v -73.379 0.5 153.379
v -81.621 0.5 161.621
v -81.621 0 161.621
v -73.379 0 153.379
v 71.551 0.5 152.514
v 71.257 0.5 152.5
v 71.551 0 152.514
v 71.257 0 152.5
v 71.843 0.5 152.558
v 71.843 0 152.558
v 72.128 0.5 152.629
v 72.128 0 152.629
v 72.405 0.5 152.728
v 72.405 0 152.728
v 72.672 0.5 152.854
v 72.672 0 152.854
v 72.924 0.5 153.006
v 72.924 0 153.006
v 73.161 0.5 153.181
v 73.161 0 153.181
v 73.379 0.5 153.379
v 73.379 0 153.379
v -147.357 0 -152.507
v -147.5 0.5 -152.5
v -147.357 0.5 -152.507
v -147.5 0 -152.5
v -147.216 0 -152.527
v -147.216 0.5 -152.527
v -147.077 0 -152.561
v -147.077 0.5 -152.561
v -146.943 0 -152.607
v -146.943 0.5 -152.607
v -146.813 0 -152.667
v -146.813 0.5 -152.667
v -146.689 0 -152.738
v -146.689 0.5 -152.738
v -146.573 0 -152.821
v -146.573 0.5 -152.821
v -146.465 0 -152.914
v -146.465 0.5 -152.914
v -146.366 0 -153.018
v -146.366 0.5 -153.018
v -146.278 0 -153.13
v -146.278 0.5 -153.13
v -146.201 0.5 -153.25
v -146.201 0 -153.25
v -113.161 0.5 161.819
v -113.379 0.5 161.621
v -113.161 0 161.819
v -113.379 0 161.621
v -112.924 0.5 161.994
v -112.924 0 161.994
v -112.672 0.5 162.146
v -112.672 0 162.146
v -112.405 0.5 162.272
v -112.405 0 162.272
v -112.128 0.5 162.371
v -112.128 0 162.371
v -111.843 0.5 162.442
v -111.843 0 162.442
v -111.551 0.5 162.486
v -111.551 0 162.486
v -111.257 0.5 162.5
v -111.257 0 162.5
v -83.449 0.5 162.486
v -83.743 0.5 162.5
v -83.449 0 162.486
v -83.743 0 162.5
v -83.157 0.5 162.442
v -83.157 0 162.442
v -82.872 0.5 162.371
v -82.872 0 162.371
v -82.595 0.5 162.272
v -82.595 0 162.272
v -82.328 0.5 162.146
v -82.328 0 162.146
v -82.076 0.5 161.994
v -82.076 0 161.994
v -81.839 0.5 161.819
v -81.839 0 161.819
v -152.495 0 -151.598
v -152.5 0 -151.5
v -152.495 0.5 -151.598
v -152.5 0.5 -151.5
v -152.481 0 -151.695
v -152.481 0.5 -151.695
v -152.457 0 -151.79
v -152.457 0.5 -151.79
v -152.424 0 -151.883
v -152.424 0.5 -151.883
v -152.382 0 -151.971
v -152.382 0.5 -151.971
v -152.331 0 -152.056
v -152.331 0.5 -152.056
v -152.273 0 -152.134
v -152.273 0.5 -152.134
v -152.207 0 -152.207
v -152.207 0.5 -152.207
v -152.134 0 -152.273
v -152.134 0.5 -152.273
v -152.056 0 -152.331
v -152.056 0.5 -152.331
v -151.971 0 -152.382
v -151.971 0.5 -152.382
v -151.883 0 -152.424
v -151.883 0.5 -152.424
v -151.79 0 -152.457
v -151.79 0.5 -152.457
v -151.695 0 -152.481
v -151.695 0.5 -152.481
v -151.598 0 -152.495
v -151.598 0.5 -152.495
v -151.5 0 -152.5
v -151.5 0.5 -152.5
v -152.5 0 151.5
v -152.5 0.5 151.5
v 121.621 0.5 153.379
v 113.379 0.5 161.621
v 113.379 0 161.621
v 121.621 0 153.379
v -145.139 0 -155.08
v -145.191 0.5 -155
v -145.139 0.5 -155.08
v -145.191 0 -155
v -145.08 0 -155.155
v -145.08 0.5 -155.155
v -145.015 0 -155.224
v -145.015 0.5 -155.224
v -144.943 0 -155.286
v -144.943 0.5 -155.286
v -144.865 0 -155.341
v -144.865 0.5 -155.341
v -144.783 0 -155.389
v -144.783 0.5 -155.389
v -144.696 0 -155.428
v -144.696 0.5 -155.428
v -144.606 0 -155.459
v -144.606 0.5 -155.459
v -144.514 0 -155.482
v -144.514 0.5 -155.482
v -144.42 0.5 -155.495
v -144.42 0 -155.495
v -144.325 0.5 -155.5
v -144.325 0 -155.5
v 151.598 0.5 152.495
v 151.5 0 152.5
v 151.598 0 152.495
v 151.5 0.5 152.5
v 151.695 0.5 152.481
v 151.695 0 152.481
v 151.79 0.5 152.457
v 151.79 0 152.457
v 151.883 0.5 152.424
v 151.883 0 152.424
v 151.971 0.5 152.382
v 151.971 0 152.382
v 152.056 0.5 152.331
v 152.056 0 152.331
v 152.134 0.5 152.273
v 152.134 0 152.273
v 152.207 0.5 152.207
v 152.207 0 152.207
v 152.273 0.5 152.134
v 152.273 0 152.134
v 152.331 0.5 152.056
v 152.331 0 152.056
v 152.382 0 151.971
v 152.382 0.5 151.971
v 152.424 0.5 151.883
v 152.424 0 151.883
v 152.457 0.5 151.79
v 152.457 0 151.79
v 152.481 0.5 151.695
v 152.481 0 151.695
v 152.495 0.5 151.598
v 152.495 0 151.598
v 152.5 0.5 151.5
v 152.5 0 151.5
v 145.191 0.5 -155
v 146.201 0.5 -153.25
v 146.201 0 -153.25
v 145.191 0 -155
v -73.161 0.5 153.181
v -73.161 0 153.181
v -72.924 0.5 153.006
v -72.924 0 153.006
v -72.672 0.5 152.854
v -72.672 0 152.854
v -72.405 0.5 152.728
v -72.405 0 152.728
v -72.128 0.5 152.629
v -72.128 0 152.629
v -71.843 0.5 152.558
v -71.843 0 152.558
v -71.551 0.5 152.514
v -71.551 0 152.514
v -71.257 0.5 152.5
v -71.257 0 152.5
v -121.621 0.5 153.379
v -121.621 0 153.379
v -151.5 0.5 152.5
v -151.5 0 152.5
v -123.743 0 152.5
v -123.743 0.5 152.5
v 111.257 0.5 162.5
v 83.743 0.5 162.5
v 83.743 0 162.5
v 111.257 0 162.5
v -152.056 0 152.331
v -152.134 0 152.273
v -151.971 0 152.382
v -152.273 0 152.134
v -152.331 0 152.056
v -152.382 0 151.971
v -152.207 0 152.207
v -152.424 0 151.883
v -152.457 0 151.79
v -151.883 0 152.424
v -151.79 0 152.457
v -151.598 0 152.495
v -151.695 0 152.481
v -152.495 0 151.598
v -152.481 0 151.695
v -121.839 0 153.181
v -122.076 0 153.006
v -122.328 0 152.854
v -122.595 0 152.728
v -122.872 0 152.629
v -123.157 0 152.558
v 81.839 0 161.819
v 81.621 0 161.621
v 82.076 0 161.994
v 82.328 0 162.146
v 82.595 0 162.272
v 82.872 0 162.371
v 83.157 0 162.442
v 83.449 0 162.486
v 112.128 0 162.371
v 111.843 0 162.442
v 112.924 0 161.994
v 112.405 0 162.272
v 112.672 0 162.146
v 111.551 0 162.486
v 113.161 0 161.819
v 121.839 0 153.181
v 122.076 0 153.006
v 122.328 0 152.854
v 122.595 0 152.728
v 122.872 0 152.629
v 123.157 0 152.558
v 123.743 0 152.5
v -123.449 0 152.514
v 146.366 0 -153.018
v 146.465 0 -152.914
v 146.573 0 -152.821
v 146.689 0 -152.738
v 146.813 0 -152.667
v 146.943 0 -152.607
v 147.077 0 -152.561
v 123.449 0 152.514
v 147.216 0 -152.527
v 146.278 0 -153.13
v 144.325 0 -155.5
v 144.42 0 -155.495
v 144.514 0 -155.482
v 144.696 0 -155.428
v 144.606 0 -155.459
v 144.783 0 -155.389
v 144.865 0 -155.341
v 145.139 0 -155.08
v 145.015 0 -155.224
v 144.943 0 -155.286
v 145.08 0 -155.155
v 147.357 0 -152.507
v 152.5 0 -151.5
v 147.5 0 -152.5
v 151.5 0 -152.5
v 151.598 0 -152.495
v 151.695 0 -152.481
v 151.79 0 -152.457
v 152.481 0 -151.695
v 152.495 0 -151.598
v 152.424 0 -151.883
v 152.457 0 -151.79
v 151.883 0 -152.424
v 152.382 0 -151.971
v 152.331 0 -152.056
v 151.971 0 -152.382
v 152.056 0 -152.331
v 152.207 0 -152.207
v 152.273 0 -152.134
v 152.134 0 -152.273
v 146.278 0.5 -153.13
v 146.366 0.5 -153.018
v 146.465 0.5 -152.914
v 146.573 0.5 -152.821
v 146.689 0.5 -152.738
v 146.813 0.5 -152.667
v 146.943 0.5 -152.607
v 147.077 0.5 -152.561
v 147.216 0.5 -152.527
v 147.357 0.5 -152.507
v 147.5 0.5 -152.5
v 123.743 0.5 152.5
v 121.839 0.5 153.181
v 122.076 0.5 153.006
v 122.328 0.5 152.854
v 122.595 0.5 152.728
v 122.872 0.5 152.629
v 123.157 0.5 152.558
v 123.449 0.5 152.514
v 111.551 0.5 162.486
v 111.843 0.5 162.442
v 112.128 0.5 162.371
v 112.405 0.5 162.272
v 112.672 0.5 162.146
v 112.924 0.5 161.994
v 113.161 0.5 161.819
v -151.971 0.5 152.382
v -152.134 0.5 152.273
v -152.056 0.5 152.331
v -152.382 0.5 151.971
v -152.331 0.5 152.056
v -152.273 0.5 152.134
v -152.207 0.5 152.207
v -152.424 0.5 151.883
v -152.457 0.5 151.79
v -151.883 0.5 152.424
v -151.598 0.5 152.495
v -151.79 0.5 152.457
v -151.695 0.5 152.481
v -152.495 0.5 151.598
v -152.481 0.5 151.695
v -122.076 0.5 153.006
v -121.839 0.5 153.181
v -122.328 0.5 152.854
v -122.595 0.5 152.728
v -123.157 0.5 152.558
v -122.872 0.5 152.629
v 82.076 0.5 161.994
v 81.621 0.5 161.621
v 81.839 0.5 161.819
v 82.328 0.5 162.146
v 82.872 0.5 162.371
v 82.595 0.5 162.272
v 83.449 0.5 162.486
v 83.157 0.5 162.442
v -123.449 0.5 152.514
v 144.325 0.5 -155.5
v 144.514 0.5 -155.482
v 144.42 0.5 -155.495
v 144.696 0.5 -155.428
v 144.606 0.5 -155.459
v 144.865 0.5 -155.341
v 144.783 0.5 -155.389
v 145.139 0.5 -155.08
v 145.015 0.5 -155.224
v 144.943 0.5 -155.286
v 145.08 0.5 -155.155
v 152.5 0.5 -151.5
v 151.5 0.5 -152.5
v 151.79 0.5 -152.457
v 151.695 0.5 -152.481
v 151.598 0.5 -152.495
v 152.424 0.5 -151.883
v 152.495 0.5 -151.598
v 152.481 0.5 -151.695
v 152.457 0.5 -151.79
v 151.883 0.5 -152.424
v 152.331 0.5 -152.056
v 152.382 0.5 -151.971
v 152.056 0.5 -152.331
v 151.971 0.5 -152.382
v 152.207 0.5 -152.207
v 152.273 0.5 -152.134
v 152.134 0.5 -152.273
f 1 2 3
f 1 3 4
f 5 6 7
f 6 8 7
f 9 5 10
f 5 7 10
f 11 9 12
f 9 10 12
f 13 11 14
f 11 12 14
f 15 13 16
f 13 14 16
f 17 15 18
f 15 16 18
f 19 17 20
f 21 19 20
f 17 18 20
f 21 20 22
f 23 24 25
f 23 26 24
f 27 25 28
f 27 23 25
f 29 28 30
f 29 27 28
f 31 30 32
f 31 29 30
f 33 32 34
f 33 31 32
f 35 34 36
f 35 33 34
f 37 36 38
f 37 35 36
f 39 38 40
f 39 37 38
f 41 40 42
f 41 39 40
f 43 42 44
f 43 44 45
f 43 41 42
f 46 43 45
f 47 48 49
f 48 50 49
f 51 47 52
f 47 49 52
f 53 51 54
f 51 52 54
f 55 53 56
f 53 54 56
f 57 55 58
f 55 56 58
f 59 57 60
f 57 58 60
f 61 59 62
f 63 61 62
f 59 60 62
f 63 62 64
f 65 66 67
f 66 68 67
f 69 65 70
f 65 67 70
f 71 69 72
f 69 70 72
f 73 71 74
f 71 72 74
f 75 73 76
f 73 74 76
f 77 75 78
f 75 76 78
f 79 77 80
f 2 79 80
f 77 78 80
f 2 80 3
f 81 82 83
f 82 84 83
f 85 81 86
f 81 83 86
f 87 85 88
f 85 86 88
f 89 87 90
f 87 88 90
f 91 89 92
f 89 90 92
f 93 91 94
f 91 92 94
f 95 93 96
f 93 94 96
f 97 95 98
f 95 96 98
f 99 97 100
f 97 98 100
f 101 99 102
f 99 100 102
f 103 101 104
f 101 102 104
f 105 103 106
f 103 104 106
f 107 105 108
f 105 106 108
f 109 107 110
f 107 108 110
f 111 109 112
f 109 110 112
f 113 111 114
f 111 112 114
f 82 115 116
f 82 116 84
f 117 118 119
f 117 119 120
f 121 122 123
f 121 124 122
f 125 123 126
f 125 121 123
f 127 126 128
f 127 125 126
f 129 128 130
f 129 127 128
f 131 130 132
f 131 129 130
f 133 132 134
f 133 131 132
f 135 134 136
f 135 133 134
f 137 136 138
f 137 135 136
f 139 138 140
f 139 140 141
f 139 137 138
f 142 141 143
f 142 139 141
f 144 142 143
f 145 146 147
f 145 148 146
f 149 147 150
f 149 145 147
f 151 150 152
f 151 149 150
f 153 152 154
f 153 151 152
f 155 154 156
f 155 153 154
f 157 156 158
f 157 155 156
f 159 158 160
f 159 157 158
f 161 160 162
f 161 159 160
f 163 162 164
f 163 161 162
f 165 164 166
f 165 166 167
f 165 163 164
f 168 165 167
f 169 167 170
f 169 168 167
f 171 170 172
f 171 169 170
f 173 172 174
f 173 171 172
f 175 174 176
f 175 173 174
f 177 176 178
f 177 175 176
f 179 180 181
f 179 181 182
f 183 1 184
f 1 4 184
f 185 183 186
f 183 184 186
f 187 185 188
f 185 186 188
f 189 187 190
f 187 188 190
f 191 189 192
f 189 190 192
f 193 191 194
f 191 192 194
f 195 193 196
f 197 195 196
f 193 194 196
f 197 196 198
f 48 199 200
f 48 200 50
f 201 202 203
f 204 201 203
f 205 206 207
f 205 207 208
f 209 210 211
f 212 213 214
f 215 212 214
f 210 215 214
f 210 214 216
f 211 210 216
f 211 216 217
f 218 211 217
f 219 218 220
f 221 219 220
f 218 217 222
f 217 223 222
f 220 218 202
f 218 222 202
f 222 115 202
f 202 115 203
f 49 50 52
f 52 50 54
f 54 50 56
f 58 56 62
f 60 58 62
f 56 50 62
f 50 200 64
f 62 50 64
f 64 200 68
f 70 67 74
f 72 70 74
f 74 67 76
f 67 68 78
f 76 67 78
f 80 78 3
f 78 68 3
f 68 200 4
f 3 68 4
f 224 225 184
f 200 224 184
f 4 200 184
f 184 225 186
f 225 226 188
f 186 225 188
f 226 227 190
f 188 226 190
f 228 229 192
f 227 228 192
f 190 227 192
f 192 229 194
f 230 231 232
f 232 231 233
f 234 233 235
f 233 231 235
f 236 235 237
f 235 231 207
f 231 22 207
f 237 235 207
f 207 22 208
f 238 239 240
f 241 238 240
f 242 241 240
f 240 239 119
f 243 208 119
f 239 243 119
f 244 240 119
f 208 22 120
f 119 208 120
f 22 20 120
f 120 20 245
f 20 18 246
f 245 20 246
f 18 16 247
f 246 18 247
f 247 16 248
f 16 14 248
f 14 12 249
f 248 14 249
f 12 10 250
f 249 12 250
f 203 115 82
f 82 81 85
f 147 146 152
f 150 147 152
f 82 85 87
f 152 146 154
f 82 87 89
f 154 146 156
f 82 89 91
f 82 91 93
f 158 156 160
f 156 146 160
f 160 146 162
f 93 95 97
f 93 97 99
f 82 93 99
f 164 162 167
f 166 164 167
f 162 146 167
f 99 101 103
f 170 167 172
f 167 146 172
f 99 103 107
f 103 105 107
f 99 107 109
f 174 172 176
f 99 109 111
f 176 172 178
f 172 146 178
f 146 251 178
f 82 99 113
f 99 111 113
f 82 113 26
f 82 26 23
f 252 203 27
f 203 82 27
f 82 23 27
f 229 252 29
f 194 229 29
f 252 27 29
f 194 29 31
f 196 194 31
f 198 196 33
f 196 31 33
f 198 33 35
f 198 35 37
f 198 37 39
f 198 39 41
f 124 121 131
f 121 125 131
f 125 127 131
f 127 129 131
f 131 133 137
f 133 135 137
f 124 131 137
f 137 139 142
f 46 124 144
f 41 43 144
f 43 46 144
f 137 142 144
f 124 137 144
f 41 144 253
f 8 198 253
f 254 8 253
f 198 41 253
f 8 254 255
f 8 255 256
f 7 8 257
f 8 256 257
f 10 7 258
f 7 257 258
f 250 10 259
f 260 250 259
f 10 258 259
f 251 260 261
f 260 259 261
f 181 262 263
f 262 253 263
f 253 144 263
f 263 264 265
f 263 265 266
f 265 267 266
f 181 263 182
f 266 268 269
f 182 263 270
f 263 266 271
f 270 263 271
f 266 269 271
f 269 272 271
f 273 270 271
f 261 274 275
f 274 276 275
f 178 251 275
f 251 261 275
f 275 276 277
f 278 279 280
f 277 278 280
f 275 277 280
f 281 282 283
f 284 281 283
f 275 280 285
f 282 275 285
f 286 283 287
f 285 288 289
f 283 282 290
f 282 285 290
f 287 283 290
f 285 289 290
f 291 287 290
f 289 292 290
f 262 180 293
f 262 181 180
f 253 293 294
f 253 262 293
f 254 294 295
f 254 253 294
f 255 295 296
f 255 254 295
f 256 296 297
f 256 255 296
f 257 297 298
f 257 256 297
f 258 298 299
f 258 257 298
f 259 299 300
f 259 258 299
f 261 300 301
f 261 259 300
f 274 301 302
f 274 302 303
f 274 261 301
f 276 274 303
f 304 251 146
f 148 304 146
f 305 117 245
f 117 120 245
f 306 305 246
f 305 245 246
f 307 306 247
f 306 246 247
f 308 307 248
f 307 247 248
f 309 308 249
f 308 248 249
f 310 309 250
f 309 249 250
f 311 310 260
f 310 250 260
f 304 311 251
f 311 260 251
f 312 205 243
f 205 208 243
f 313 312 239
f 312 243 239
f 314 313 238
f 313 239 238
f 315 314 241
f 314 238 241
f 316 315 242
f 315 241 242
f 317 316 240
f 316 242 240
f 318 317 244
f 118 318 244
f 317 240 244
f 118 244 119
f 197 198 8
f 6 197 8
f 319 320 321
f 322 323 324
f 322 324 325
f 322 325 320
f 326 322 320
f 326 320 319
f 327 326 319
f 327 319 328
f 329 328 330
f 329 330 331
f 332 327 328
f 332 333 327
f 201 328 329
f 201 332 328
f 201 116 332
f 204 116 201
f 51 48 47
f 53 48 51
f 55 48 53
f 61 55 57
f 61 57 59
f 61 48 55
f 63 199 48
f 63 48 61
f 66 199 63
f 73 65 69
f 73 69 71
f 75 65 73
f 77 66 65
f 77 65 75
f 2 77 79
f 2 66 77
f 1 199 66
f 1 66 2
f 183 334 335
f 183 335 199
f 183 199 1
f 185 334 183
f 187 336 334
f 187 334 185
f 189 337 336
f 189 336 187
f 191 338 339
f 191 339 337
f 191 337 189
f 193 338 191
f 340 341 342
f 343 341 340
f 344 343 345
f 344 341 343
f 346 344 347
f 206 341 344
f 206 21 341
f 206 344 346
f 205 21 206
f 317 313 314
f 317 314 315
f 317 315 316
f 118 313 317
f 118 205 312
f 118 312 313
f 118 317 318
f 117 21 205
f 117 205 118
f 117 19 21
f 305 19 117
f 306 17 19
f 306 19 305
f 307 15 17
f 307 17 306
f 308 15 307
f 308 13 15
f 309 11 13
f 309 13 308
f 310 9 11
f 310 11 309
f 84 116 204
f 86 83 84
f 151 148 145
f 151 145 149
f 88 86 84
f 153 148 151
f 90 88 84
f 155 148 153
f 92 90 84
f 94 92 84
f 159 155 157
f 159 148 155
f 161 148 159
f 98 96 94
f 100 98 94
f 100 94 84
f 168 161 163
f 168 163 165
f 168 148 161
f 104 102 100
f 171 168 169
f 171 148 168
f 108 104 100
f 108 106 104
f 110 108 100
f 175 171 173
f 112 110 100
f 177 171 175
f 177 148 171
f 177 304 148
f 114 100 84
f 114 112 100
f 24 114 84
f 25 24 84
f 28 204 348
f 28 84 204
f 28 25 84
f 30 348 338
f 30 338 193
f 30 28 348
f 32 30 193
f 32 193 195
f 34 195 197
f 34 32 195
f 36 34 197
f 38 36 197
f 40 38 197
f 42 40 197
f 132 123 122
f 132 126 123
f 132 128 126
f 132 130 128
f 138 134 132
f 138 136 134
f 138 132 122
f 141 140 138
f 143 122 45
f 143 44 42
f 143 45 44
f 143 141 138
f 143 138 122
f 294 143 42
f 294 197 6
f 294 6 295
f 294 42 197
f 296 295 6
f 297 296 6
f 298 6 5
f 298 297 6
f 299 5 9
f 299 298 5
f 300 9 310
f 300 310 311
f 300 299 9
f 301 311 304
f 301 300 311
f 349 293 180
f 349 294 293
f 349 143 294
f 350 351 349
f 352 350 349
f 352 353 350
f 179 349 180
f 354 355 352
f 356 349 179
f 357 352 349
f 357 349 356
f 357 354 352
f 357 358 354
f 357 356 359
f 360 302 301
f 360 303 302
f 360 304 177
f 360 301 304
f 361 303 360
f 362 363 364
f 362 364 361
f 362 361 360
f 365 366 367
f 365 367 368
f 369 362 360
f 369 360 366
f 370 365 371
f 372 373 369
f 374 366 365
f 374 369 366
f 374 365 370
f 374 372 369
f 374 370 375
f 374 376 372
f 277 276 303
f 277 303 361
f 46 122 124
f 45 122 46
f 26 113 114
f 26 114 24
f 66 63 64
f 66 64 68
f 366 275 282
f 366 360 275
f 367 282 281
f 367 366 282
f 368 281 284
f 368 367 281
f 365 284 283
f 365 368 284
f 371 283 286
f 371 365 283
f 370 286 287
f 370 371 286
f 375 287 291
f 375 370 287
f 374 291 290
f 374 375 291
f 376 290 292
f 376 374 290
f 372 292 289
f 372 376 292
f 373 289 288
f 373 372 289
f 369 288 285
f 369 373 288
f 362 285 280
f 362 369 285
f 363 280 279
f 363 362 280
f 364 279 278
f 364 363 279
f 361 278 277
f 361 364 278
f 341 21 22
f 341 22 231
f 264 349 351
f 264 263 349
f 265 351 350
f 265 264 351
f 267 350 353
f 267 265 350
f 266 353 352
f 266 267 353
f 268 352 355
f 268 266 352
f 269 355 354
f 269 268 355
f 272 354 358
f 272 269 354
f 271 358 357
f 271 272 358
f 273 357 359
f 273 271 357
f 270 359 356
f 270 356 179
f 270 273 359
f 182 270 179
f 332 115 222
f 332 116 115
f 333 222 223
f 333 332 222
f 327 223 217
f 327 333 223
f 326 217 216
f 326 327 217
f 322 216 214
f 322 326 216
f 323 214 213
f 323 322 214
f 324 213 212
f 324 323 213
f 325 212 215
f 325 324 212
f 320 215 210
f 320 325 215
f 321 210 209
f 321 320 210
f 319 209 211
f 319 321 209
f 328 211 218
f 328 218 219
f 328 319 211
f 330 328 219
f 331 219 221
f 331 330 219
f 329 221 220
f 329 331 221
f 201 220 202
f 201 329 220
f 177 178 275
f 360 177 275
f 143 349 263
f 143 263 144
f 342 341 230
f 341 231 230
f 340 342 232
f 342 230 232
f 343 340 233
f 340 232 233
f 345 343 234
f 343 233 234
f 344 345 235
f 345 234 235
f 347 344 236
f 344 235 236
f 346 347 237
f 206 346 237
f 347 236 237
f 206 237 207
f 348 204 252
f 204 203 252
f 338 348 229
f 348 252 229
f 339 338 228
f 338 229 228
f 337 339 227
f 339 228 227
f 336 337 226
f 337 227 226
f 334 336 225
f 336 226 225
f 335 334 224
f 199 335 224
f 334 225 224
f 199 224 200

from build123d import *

# Parameters (mm, degrees)
SKETCH1_W           = 305
SKETCH1_H           = 305
BOSS_EXTRUDE1_DEPTH = 0.5
BOSS_EXTRUDE2_DEPTH = 0.5
FILLET1_R           = 1
FILLET2_R           = 1.5
FILLET3_R           = 3


with BuildPart() as part:
    # Sketch1 → Boss-Extrude1 (new body)
    with BuildSketch(Plane(origin=(0, 0, 0), x_dir=(1, 0, 0), z_dir=(0, 1, 0))):
        Rectangle(SKETCH1_W, SKETCH1_H)
    extrude(amount=BOSS_EXTRUDE1_DEPTH)

    # Sketch2 → Boss-Extrude2 (add)
    with BuildSketch(Plane(origin=(0, 0.5, 0), x_dir=(1, 0, 0), z_dir=(0, 1, 0))):
        Polygon((-72.5, -152.5), (-122.5, -152.5), (-112.5, -162.5), (-82.5, -162.5), align=None)
        Polygon((112.5, -162.5), (122.5, -152.5), (72.5, -152.5), (82.5, -162.5), align=None)
        Polygon((-144.901923792, 155.5), (-146.6339746, 152.5), (146.6339746, 152.5), (144.901923792, 155.5), align=None)
    extrude(amount=-BOSS_EXTRUDE2_DEPTH)

    # Fillet1
    fillet1_edges = [part.edges().sort_by_distance(p)[0] for p in [
        (-144.901923792, 0.25, -155.5),
        (144.901923792, 0.25, -155.5),
        (152.5, 0.25, 152.5),
        (-152.5, 0.25, 152.5),
        (-152.5, 0.25, -152.5),
        (152.5, 0.25, -152.5),
    ]]
    fillet(fillet1_edges, radius=FILLET1_R)

    # Fillet2
    fillet2_edges = [part.edges().sort_by_distance(p)[0] for p in [
        (-146.6339746, 0.25, -152.5),
        (146.6339746, 0.25, -152.5),
    ]]
    fillet(fillet2_edges, radius=FILLET2_R)

    # Fillet3
    fillet3_edges = [part.edges().sort_by_distance(p)[0] for p in [
        (-72.5, 0.25, 152.5),
        (-82.5, 0.25, 162.5),
        (-112.5, 0.25, 162.5),
        (122.5, 0.25, 152.5),
        (112.5, 0.25, 162.5),
        (82.5, 0.25, 162.5),
        (72.5, 0.25, 152.5),
        (-122.5, 0.25, 152.5),
    ]]
    fillet(fillet3_edges, radius=FILLET3_R)


solid = part.part
